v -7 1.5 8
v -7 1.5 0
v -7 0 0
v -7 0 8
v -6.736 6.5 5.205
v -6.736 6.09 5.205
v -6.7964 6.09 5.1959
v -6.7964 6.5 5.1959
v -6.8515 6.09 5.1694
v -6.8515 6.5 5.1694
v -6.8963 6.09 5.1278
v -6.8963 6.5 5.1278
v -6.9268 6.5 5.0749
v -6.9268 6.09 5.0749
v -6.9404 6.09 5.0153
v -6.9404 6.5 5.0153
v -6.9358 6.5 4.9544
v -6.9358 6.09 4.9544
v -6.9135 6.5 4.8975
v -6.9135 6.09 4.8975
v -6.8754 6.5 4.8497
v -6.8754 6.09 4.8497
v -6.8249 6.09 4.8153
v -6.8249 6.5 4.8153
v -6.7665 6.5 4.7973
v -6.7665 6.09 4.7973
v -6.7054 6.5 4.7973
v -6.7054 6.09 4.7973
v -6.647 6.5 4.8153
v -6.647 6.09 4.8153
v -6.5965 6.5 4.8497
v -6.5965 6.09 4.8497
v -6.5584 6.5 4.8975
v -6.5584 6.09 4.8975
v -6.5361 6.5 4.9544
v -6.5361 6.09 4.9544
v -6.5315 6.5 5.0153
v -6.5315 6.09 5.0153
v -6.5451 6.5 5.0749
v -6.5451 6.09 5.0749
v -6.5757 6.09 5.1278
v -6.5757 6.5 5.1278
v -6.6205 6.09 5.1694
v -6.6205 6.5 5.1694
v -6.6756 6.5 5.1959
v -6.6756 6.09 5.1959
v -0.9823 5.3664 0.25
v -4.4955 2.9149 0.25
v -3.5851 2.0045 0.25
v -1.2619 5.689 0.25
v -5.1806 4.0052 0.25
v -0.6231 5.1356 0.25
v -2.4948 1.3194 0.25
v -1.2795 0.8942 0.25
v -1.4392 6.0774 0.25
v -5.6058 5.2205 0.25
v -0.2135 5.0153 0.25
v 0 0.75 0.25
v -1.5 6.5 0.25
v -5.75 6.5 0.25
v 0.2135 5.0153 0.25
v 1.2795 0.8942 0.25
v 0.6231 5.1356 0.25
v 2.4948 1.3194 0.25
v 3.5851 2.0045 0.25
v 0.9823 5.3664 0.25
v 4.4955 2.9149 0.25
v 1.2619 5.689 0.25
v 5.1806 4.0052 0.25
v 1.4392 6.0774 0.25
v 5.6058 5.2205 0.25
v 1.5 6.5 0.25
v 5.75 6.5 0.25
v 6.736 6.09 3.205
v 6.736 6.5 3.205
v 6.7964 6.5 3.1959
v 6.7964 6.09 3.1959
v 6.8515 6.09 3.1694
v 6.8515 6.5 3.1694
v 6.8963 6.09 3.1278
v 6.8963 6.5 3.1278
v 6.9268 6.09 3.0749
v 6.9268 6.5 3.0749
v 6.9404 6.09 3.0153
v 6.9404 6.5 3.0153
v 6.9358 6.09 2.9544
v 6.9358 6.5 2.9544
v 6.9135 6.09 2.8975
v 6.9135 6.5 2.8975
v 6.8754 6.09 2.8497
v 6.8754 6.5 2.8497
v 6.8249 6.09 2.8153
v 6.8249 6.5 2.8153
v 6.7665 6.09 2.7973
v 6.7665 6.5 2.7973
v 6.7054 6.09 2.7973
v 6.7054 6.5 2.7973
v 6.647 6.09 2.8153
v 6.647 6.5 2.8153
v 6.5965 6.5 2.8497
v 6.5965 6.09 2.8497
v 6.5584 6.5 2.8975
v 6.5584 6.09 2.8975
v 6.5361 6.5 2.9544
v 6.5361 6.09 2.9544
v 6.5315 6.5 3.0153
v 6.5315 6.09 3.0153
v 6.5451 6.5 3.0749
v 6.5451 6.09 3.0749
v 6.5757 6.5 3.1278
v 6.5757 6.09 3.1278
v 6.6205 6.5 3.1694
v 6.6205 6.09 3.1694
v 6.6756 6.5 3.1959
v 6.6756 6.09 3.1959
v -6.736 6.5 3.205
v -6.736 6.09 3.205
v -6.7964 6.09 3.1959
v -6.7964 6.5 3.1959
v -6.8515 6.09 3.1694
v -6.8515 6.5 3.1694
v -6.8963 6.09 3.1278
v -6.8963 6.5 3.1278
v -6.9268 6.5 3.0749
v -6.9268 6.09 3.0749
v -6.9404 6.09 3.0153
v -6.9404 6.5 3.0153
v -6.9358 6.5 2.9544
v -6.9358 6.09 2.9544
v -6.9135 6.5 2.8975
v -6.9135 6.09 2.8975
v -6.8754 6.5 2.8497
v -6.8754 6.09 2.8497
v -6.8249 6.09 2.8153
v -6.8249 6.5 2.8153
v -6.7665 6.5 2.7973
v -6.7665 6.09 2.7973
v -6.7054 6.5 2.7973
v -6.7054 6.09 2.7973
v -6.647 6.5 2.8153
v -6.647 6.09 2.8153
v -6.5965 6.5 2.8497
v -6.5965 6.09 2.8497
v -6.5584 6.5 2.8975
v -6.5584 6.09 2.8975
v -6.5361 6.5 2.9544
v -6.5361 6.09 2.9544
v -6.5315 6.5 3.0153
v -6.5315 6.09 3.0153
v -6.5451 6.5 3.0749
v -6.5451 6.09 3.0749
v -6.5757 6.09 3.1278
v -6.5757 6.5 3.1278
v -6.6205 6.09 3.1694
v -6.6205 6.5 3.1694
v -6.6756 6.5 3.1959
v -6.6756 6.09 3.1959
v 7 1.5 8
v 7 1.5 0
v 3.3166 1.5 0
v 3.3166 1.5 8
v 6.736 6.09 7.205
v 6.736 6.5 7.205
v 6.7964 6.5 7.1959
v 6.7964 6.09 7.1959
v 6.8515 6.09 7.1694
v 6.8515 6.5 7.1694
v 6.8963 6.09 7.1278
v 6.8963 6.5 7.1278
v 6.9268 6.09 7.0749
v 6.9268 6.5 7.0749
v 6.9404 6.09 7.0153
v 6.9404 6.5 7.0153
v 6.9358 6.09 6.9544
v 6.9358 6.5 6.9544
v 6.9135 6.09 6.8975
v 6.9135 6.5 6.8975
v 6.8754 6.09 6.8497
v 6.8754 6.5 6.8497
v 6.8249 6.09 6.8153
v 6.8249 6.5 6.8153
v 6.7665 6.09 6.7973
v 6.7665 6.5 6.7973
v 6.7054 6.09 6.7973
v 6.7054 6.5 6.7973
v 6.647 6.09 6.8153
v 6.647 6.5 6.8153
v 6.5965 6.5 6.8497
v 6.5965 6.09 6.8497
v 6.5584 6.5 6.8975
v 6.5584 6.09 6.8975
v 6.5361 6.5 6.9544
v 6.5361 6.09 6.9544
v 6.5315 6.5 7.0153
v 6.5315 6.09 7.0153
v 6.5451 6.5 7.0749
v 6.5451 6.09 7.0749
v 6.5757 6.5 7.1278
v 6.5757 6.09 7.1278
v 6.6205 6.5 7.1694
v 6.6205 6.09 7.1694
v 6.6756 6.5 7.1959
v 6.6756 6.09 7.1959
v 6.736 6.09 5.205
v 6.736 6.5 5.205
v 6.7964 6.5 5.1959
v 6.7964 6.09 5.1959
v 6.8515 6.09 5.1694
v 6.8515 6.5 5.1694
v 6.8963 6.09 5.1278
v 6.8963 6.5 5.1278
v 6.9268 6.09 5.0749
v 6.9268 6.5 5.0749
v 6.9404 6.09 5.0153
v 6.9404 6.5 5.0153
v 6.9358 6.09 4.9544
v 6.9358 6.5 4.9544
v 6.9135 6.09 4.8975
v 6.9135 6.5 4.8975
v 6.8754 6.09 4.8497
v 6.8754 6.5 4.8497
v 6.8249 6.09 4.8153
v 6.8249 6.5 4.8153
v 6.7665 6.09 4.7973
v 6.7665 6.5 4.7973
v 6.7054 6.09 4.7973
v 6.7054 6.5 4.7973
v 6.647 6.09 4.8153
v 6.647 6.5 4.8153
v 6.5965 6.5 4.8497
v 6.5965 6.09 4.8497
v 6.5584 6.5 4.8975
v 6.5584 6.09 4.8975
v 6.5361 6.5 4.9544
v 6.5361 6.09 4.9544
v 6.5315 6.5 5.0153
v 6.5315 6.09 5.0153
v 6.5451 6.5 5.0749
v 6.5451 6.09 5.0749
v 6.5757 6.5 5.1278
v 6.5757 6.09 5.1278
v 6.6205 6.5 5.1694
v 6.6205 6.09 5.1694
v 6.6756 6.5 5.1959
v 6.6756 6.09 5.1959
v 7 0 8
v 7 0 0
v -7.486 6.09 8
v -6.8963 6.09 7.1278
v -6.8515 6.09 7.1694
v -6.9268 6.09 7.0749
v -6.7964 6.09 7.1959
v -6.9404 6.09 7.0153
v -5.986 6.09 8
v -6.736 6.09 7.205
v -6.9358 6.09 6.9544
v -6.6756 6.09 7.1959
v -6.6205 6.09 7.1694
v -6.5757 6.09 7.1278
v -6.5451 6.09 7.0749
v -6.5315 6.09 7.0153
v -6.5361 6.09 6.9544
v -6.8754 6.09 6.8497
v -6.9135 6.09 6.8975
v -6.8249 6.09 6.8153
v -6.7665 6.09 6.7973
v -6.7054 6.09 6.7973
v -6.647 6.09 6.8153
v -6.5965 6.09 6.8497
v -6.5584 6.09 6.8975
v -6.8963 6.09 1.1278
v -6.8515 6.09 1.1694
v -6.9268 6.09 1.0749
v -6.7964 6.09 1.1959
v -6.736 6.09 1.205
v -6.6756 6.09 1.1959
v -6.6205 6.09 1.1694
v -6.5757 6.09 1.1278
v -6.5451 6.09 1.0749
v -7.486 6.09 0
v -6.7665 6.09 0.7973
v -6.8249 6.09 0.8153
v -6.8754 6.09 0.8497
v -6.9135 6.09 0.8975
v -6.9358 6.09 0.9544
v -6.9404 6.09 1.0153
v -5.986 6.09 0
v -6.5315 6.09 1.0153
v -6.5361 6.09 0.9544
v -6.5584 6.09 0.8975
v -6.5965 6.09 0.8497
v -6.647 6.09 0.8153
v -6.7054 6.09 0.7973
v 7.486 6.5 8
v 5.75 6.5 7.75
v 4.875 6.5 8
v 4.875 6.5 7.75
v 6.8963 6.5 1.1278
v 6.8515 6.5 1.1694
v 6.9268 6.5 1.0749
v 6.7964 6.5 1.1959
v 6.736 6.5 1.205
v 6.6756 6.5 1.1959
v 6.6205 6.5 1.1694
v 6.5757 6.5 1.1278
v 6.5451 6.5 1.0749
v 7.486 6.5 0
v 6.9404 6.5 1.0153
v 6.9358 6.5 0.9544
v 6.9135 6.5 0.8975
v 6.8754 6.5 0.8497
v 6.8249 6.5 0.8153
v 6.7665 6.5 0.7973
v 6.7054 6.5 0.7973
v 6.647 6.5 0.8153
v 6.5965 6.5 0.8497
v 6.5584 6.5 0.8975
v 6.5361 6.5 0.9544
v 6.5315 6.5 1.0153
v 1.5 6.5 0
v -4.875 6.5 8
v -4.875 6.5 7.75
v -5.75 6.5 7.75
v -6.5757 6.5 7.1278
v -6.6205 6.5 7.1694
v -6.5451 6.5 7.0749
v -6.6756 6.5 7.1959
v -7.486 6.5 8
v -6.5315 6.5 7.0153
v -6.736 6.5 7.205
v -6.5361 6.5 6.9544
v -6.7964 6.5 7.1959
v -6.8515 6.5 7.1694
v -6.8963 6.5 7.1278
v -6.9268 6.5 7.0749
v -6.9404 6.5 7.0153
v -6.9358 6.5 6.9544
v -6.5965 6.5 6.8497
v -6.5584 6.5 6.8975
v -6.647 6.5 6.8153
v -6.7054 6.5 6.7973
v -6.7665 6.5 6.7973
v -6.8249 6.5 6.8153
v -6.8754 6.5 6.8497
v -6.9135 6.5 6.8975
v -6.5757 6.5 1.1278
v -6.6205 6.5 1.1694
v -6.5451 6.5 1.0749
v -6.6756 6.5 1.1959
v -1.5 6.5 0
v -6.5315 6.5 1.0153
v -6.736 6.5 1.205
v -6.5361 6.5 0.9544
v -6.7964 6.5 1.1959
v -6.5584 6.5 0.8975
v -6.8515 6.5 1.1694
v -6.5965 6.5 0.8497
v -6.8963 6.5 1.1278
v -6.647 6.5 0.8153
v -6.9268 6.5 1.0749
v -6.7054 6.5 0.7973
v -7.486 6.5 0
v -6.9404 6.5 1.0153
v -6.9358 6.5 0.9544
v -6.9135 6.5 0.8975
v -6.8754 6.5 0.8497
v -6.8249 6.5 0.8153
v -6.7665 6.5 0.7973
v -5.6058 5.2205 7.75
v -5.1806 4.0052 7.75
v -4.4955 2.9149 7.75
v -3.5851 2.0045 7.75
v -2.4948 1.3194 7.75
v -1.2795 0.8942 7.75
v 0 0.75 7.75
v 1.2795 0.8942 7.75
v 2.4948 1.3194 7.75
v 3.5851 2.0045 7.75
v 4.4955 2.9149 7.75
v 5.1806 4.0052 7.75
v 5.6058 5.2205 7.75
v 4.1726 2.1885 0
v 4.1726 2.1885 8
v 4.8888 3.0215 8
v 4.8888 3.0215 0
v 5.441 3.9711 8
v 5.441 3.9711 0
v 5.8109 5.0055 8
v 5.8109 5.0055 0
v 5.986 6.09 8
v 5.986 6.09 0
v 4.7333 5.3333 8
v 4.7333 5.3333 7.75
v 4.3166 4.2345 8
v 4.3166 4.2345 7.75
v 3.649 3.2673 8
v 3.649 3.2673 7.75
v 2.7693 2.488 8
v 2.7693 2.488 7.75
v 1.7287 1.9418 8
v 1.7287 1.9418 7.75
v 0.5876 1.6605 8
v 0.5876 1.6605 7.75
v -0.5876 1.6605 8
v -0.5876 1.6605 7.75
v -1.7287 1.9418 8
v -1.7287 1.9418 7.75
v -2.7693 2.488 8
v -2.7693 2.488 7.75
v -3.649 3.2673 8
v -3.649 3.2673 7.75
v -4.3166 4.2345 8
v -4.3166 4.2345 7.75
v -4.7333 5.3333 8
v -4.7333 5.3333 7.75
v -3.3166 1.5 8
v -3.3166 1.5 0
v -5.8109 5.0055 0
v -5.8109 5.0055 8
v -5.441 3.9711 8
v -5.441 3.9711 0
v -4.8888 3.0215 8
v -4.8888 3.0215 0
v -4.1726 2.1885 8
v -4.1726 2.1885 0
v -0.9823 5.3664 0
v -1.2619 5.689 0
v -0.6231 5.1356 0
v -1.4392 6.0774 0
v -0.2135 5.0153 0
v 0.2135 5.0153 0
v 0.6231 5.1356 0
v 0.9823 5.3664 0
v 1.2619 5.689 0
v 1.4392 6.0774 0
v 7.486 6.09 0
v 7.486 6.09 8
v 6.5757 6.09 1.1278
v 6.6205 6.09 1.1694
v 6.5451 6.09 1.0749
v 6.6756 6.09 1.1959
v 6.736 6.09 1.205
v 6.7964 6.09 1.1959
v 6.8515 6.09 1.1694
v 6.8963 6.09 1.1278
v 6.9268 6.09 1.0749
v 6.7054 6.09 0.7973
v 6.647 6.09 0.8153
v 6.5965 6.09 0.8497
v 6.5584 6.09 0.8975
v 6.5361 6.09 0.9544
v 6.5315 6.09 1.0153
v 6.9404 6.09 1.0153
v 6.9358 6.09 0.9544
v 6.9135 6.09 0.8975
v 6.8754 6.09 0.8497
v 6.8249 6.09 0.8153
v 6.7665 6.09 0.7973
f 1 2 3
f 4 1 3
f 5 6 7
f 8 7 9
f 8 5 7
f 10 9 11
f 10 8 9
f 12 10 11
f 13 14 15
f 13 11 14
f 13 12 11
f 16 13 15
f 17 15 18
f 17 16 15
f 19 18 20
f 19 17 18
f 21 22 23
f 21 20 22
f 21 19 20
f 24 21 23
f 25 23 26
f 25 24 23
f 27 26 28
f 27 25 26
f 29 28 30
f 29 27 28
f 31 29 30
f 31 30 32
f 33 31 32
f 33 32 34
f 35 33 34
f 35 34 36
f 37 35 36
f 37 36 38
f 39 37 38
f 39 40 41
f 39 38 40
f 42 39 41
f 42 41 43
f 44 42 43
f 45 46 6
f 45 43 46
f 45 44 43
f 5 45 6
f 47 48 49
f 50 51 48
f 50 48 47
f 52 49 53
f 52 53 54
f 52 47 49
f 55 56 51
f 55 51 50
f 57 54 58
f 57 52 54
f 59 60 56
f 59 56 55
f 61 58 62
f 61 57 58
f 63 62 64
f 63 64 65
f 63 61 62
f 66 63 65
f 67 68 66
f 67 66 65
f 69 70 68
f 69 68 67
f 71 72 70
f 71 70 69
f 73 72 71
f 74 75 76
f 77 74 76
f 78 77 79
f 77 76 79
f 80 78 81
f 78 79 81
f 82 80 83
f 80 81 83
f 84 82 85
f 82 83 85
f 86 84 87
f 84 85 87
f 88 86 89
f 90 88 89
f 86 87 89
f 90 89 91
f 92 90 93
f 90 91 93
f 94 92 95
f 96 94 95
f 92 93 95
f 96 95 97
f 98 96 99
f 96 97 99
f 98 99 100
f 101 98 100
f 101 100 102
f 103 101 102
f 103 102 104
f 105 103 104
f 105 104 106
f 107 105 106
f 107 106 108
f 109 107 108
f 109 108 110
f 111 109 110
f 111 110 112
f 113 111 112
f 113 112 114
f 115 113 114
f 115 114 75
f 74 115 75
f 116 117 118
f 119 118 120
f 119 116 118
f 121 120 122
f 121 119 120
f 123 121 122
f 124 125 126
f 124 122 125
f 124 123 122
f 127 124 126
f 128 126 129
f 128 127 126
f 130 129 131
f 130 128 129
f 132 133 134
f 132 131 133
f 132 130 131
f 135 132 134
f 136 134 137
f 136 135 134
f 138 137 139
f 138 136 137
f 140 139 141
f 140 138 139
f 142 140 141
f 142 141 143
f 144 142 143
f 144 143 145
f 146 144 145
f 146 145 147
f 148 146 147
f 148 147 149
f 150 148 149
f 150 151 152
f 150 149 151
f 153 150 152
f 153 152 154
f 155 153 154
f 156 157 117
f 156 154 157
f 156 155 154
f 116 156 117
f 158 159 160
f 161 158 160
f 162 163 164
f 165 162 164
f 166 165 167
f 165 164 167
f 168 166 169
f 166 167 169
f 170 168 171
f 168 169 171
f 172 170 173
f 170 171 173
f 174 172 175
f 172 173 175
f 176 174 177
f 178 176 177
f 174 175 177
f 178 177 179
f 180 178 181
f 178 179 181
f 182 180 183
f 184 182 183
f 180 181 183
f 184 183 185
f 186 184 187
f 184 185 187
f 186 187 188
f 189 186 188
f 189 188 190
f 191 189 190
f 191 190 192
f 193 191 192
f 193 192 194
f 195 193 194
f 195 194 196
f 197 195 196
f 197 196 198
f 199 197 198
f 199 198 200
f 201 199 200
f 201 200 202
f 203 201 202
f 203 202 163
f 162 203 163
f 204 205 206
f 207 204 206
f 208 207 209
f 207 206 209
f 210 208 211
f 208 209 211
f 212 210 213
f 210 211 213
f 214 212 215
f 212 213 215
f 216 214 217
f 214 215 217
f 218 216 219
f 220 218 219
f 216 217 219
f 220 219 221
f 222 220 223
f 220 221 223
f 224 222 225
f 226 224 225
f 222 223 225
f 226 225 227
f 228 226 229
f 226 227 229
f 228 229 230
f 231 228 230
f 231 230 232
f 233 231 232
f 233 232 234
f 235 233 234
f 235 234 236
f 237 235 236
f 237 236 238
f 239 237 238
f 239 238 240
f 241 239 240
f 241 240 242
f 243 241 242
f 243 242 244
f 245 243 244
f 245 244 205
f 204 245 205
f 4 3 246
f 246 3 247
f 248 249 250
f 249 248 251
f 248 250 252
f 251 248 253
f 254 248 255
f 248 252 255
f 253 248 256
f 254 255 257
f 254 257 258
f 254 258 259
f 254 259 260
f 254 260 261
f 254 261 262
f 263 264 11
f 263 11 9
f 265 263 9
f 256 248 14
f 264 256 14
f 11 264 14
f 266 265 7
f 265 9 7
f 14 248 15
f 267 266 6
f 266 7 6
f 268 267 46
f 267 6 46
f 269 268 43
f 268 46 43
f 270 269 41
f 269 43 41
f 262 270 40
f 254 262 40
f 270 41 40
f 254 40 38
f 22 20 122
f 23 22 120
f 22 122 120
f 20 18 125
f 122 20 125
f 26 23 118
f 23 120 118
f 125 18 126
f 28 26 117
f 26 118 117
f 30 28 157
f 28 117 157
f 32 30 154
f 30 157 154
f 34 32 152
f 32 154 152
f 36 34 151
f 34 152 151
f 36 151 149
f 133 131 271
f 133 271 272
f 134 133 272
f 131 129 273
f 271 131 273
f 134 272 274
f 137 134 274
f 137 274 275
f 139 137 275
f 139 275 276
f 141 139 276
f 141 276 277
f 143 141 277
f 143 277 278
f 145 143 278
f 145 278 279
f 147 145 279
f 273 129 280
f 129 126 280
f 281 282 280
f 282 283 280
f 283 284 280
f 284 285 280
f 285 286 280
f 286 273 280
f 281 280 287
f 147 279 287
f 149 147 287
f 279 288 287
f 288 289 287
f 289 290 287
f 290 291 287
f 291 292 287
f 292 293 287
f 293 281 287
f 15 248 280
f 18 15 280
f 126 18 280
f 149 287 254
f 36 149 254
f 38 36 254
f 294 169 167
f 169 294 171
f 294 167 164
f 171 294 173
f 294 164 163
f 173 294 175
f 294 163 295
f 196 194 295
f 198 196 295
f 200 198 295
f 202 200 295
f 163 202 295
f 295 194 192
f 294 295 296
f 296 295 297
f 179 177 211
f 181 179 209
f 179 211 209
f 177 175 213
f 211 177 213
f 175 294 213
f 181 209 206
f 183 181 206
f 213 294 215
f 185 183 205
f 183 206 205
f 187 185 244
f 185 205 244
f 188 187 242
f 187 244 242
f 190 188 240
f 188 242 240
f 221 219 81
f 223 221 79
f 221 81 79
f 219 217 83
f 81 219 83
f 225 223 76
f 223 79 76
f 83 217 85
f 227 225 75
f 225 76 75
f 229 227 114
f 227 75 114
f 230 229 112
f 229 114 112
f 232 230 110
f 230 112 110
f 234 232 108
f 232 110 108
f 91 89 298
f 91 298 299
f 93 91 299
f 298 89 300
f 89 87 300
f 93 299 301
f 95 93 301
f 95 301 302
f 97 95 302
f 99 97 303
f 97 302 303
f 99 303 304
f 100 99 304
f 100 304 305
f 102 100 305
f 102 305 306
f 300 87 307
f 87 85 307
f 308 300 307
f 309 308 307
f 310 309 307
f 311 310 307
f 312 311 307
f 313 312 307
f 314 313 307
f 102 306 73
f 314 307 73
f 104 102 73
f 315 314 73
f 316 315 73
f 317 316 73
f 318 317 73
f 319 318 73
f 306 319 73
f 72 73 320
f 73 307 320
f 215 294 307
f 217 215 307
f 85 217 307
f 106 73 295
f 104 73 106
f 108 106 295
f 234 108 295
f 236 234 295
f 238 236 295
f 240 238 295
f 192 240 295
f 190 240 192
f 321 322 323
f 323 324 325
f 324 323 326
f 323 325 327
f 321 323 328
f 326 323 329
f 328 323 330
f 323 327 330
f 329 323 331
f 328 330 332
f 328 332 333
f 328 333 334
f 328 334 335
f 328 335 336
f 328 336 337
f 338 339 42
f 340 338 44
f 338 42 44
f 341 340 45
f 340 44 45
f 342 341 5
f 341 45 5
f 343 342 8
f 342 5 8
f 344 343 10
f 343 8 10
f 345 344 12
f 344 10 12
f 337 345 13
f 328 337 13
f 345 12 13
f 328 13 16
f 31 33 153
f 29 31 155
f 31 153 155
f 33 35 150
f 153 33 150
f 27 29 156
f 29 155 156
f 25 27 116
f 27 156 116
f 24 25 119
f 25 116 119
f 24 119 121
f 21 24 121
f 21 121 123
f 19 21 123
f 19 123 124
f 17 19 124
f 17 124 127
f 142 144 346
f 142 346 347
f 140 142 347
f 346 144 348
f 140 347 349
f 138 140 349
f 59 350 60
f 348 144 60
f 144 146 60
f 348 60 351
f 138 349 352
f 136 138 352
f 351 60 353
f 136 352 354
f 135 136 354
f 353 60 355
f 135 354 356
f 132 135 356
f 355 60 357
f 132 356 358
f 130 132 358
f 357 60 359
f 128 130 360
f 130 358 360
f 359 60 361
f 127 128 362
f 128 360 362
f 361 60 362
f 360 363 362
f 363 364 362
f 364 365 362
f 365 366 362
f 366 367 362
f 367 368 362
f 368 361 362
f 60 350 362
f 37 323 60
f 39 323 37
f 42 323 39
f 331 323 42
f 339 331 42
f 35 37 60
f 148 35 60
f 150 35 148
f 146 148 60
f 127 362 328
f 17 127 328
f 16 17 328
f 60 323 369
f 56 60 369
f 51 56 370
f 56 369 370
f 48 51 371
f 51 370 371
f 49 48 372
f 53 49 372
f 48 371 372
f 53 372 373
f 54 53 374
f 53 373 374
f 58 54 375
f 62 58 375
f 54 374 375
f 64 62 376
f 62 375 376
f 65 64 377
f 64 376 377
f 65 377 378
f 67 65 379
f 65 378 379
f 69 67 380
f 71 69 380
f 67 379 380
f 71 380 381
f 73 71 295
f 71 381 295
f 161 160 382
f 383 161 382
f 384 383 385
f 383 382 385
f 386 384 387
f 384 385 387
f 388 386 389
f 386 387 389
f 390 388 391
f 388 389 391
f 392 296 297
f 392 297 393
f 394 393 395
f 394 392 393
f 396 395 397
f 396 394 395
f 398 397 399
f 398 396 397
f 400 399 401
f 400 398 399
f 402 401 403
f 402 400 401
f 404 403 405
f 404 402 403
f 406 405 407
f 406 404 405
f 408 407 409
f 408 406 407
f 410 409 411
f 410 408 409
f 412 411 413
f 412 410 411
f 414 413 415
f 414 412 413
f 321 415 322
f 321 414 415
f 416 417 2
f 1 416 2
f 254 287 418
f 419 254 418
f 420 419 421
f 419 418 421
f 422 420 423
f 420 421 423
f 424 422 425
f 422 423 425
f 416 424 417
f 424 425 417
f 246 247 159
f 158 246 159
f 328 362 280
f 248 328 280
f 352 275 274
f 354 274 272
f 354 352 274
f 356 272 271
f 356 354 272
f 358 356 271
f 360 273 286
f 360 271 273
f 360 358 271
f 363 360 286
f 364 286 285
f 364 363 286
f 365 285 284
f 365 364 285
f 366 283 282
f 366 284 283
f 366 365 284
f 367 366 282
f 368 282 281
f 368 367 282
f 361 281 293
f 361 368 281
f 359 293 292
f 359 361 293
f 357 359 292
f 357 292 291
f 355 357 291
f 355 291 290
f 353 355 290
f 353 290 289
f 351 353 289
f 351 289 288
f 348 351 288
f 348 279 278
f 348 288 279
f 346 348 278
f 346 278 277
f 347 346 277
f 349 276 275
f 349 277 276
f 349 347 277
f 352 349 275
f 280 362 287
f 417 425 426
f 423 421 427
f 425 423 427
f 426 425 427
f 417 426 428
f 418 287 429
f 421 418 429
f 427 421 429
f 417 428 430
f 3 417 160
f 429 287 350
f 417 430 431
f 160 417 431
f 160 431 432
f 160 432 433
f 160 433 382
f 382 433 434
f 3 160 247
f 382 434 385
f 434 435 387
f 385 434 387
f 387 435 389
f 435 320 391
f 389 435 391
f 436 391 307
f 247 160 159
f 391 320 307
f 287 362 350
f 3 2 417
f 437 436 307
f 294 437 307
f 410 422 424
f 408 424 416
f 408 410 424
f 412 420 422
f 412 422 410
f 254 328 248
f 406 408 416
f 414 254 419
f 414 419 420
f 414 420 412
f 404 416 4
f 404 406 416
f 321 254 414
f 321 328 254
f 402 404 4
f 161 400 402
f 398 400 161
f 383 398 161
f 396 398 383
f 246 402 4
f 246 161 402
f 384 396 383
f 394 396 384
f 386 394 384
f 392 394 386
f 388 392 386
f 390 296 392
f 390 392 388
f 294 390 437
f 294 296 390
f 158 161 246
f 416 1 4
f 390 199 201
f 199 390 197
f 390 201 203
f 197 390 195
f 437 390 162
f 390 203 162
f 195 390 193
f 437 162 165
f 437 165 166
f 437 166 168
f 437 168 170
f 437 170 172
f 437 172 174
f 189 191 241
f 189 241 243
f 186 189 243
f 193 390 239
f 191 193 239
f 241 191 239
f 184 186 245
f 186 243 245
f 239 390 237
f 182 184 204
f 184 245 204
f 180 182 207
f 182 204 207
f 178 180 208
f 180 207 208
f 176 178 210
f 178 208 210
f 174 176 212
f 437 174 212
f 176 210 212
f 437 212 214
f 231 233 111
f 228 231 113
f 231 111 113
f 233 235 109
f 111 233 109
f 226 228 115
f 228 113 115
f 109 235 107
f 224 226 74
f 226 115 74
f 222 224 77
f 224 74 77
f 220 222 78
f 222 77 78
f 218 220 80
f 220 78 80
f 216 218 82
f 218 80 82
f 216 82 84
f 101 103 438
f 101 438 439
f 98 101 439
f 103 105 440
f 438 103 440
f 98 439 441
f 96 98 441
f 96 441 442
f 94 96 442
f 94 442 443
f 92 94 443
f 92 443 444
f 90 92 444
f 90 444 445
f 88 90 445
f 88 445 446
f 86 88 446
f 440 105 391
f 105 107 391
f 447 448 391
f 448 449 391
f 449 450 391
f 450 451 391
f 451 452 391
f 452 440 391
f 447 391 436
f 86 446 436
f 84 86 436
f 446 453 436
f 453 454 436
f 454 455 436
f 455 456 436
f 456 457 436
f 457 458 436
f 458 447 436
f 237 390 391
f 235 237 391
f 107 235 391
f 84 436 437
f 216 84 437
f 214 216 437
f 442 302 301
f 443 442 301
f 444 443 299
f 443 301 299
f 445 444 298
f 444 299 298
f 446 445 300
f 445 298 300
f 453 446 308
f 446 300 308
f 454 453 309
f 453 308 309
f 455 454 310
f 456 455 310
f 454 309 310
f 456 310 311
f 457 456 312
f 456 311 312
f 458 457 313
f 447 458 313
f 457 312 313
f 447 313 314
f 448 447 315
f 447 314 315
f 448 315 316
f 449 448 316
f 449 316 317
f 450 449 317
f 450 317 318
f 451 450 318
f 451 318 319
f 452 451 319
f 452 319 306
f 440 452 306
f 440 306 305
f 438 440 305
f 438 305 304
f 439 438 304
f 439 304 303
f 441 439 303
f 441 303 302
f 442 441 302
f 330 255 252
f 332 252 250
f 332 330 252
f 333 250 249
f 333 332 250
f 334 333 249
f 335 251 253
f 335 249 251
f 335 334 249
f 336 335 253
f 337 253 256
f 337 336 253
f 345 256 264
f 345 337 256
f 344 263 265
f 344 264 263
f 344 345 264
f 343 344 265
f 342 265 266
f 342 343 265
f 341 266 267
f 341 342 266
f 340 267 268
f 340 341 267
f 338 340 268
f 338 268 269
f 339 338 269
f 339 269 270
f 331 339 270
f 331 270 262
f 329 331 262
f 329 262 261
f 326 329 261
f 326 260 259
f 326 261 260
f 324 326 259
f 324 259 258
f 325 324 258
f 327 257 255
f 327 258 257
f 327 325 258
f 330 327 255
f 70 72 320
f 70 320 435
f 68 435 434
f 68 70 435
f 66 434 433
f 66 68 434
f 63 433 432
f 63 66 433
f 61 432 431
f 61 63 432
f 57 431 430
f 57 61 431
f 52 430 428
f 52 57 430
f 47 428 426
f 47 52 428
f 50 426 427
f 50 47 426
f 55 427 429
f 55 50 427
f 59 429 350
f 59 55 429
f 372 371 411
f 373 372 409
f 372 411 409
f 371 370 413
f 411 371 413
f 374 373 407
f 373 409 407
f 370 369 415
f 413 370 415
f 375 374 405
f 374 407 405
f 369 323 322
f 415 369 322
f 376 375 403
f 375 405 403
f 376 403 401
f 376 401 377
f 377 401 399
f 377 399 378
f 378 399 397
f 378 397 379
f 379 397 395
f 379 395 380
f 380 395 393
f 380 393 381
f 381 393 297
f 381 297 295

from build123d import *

# Parameters (mm, degrees)
BOSS_EXTRUDE1_DEPTH = 8
CUT_EXTRUDE1_DEPTH  = 3.75
CUT_EXTRUDE2_DEPTH  = 3.75
CUT_EXTRUDE3_DEPTH  = 3.75
SKETCH7_R           = 0.205
CUT_EXTRUDE5_DEPTH  = 2


with BuildPart() as part:
    # Sketch1 → Boss-Extrude1 (new body)
    with BuildSketch(Plane.XY):
        with BuildLine():
            Line((-7, 0), (7, 0))
            Line((7, 0), (7, 1.5))
            Line((7, 1.5), (3.31662479, 1.5))
            ThreePointArc((3.31662479, 1.5), (5.186676874, 3.483647401), (5.985975276, 6.09))
            Line((5.985975276, 6.09), (7.485975276, 6.09))
            Line((7.485975276, 6.09), (7.485975276, 6.5))
            Line((7.485975276, 6.5), (4.875, 6.5))
            Line((4.875, 6.5), (-4.875, 6.5))
            Line((-4.875, 6.5), (-7.485975276, 6.5))
            Line((-7.485975276, 6.5), (-7.485975276, 6.09))
            Line((-7.485975276, 6.09), (-5.985975276, 6.09))
            ThreePointArc((-5.985975276, 6.09), (-5.186676874, 3.483647401), (-3.31662479, 1.5))
            Line((-3.31662479, 1.5), (-7, 1.5))
            Line((-7, 1.5), (-7, 0))
        make_face()
    extrude(amount=BOSS_EXTRUDE1_DEPTH)

    # Sketch3 → Cut-Extrude1 (cut, symmetric)
    with BuildSketch(Plane.XY.offset(4)):
        with BuildLine():
            Line((5.75, 6.5), (-5.75, 6.5))
            ThreePointArc((-5.75, 6.5), (0, 0.75), (5.75, 6.5))
        make_face()
    extrude(amount=CUT_EXTRUDE1_DEPTH, both=True, mode=Mode.SUBTRACT)

    # Sketch4 → Cut-Extrude2 (cut, symmetric)
    with BuildSketch(Plane.XY.offset(8)):
        with BuildLine():
            Line((-4.875, 6.5), (4.875, 6.5))
            ThreePointArc((4.875, 6.5), (0, 1.625), (-4.875, 6.5))
        make_face()
    extrude(amount=CUT_EXTRUDE2_DEPTH, both=True, mode=Mode.SUBTRACT)

    # Sketch6 → Cut-Extrude3 (cut, symmetric)
    with BuildSketch(Plane.XY.offset(0.25)):
        with BuildLine():
            Line((-1.5, 6.5), (1.5, 6.5))
            ThreePointArc((1.5, 6.5), (0, 5), (-1.5, 6.5))
        make_face()
    extrude(amount=CUT_EXTRUDE3_DEPTH, both=True, mode=Mode.SUBTRACT)

    # Sketch7 → Cut-Extrude5 (cut)
    with BuildSketch(Plane(origin=(0, 6.5, 0), x_dir=(1, 0, 0), z_dir=(0, 1, 0))):
        with Locations(Location((6.735975276, -7, 0), (0, 0, 270))):
            Circle(SKETCH7_R)
        with Locations(Location((6.735975276, -5, 0), (0, 0, 270))):
            Circle(SKETCH7_R)
        with Locations(Location((6.735975276, -3, 0), (0, 0, 270))):
            Circle(SKETCH7_R)
        with Locations(Location((6.735975276, -1, 0), (0, 0, 270))):
            Circle(SKETCH7_R)
    cut_extrude5 = extrude(amount=-CUT_EXTRUDE5_DEPTH, mode=Mode.SUBTRACT)

    # Mirror1: Cut-Extrude5 across plane
    add(cut_extrude5.mirror(Plane(origin=(0, 0, 0), x_dir=(0, 0, 1), z_dir=(1, 0, 0))), mode=Mode.SUBTRACT)


solid = part.part
